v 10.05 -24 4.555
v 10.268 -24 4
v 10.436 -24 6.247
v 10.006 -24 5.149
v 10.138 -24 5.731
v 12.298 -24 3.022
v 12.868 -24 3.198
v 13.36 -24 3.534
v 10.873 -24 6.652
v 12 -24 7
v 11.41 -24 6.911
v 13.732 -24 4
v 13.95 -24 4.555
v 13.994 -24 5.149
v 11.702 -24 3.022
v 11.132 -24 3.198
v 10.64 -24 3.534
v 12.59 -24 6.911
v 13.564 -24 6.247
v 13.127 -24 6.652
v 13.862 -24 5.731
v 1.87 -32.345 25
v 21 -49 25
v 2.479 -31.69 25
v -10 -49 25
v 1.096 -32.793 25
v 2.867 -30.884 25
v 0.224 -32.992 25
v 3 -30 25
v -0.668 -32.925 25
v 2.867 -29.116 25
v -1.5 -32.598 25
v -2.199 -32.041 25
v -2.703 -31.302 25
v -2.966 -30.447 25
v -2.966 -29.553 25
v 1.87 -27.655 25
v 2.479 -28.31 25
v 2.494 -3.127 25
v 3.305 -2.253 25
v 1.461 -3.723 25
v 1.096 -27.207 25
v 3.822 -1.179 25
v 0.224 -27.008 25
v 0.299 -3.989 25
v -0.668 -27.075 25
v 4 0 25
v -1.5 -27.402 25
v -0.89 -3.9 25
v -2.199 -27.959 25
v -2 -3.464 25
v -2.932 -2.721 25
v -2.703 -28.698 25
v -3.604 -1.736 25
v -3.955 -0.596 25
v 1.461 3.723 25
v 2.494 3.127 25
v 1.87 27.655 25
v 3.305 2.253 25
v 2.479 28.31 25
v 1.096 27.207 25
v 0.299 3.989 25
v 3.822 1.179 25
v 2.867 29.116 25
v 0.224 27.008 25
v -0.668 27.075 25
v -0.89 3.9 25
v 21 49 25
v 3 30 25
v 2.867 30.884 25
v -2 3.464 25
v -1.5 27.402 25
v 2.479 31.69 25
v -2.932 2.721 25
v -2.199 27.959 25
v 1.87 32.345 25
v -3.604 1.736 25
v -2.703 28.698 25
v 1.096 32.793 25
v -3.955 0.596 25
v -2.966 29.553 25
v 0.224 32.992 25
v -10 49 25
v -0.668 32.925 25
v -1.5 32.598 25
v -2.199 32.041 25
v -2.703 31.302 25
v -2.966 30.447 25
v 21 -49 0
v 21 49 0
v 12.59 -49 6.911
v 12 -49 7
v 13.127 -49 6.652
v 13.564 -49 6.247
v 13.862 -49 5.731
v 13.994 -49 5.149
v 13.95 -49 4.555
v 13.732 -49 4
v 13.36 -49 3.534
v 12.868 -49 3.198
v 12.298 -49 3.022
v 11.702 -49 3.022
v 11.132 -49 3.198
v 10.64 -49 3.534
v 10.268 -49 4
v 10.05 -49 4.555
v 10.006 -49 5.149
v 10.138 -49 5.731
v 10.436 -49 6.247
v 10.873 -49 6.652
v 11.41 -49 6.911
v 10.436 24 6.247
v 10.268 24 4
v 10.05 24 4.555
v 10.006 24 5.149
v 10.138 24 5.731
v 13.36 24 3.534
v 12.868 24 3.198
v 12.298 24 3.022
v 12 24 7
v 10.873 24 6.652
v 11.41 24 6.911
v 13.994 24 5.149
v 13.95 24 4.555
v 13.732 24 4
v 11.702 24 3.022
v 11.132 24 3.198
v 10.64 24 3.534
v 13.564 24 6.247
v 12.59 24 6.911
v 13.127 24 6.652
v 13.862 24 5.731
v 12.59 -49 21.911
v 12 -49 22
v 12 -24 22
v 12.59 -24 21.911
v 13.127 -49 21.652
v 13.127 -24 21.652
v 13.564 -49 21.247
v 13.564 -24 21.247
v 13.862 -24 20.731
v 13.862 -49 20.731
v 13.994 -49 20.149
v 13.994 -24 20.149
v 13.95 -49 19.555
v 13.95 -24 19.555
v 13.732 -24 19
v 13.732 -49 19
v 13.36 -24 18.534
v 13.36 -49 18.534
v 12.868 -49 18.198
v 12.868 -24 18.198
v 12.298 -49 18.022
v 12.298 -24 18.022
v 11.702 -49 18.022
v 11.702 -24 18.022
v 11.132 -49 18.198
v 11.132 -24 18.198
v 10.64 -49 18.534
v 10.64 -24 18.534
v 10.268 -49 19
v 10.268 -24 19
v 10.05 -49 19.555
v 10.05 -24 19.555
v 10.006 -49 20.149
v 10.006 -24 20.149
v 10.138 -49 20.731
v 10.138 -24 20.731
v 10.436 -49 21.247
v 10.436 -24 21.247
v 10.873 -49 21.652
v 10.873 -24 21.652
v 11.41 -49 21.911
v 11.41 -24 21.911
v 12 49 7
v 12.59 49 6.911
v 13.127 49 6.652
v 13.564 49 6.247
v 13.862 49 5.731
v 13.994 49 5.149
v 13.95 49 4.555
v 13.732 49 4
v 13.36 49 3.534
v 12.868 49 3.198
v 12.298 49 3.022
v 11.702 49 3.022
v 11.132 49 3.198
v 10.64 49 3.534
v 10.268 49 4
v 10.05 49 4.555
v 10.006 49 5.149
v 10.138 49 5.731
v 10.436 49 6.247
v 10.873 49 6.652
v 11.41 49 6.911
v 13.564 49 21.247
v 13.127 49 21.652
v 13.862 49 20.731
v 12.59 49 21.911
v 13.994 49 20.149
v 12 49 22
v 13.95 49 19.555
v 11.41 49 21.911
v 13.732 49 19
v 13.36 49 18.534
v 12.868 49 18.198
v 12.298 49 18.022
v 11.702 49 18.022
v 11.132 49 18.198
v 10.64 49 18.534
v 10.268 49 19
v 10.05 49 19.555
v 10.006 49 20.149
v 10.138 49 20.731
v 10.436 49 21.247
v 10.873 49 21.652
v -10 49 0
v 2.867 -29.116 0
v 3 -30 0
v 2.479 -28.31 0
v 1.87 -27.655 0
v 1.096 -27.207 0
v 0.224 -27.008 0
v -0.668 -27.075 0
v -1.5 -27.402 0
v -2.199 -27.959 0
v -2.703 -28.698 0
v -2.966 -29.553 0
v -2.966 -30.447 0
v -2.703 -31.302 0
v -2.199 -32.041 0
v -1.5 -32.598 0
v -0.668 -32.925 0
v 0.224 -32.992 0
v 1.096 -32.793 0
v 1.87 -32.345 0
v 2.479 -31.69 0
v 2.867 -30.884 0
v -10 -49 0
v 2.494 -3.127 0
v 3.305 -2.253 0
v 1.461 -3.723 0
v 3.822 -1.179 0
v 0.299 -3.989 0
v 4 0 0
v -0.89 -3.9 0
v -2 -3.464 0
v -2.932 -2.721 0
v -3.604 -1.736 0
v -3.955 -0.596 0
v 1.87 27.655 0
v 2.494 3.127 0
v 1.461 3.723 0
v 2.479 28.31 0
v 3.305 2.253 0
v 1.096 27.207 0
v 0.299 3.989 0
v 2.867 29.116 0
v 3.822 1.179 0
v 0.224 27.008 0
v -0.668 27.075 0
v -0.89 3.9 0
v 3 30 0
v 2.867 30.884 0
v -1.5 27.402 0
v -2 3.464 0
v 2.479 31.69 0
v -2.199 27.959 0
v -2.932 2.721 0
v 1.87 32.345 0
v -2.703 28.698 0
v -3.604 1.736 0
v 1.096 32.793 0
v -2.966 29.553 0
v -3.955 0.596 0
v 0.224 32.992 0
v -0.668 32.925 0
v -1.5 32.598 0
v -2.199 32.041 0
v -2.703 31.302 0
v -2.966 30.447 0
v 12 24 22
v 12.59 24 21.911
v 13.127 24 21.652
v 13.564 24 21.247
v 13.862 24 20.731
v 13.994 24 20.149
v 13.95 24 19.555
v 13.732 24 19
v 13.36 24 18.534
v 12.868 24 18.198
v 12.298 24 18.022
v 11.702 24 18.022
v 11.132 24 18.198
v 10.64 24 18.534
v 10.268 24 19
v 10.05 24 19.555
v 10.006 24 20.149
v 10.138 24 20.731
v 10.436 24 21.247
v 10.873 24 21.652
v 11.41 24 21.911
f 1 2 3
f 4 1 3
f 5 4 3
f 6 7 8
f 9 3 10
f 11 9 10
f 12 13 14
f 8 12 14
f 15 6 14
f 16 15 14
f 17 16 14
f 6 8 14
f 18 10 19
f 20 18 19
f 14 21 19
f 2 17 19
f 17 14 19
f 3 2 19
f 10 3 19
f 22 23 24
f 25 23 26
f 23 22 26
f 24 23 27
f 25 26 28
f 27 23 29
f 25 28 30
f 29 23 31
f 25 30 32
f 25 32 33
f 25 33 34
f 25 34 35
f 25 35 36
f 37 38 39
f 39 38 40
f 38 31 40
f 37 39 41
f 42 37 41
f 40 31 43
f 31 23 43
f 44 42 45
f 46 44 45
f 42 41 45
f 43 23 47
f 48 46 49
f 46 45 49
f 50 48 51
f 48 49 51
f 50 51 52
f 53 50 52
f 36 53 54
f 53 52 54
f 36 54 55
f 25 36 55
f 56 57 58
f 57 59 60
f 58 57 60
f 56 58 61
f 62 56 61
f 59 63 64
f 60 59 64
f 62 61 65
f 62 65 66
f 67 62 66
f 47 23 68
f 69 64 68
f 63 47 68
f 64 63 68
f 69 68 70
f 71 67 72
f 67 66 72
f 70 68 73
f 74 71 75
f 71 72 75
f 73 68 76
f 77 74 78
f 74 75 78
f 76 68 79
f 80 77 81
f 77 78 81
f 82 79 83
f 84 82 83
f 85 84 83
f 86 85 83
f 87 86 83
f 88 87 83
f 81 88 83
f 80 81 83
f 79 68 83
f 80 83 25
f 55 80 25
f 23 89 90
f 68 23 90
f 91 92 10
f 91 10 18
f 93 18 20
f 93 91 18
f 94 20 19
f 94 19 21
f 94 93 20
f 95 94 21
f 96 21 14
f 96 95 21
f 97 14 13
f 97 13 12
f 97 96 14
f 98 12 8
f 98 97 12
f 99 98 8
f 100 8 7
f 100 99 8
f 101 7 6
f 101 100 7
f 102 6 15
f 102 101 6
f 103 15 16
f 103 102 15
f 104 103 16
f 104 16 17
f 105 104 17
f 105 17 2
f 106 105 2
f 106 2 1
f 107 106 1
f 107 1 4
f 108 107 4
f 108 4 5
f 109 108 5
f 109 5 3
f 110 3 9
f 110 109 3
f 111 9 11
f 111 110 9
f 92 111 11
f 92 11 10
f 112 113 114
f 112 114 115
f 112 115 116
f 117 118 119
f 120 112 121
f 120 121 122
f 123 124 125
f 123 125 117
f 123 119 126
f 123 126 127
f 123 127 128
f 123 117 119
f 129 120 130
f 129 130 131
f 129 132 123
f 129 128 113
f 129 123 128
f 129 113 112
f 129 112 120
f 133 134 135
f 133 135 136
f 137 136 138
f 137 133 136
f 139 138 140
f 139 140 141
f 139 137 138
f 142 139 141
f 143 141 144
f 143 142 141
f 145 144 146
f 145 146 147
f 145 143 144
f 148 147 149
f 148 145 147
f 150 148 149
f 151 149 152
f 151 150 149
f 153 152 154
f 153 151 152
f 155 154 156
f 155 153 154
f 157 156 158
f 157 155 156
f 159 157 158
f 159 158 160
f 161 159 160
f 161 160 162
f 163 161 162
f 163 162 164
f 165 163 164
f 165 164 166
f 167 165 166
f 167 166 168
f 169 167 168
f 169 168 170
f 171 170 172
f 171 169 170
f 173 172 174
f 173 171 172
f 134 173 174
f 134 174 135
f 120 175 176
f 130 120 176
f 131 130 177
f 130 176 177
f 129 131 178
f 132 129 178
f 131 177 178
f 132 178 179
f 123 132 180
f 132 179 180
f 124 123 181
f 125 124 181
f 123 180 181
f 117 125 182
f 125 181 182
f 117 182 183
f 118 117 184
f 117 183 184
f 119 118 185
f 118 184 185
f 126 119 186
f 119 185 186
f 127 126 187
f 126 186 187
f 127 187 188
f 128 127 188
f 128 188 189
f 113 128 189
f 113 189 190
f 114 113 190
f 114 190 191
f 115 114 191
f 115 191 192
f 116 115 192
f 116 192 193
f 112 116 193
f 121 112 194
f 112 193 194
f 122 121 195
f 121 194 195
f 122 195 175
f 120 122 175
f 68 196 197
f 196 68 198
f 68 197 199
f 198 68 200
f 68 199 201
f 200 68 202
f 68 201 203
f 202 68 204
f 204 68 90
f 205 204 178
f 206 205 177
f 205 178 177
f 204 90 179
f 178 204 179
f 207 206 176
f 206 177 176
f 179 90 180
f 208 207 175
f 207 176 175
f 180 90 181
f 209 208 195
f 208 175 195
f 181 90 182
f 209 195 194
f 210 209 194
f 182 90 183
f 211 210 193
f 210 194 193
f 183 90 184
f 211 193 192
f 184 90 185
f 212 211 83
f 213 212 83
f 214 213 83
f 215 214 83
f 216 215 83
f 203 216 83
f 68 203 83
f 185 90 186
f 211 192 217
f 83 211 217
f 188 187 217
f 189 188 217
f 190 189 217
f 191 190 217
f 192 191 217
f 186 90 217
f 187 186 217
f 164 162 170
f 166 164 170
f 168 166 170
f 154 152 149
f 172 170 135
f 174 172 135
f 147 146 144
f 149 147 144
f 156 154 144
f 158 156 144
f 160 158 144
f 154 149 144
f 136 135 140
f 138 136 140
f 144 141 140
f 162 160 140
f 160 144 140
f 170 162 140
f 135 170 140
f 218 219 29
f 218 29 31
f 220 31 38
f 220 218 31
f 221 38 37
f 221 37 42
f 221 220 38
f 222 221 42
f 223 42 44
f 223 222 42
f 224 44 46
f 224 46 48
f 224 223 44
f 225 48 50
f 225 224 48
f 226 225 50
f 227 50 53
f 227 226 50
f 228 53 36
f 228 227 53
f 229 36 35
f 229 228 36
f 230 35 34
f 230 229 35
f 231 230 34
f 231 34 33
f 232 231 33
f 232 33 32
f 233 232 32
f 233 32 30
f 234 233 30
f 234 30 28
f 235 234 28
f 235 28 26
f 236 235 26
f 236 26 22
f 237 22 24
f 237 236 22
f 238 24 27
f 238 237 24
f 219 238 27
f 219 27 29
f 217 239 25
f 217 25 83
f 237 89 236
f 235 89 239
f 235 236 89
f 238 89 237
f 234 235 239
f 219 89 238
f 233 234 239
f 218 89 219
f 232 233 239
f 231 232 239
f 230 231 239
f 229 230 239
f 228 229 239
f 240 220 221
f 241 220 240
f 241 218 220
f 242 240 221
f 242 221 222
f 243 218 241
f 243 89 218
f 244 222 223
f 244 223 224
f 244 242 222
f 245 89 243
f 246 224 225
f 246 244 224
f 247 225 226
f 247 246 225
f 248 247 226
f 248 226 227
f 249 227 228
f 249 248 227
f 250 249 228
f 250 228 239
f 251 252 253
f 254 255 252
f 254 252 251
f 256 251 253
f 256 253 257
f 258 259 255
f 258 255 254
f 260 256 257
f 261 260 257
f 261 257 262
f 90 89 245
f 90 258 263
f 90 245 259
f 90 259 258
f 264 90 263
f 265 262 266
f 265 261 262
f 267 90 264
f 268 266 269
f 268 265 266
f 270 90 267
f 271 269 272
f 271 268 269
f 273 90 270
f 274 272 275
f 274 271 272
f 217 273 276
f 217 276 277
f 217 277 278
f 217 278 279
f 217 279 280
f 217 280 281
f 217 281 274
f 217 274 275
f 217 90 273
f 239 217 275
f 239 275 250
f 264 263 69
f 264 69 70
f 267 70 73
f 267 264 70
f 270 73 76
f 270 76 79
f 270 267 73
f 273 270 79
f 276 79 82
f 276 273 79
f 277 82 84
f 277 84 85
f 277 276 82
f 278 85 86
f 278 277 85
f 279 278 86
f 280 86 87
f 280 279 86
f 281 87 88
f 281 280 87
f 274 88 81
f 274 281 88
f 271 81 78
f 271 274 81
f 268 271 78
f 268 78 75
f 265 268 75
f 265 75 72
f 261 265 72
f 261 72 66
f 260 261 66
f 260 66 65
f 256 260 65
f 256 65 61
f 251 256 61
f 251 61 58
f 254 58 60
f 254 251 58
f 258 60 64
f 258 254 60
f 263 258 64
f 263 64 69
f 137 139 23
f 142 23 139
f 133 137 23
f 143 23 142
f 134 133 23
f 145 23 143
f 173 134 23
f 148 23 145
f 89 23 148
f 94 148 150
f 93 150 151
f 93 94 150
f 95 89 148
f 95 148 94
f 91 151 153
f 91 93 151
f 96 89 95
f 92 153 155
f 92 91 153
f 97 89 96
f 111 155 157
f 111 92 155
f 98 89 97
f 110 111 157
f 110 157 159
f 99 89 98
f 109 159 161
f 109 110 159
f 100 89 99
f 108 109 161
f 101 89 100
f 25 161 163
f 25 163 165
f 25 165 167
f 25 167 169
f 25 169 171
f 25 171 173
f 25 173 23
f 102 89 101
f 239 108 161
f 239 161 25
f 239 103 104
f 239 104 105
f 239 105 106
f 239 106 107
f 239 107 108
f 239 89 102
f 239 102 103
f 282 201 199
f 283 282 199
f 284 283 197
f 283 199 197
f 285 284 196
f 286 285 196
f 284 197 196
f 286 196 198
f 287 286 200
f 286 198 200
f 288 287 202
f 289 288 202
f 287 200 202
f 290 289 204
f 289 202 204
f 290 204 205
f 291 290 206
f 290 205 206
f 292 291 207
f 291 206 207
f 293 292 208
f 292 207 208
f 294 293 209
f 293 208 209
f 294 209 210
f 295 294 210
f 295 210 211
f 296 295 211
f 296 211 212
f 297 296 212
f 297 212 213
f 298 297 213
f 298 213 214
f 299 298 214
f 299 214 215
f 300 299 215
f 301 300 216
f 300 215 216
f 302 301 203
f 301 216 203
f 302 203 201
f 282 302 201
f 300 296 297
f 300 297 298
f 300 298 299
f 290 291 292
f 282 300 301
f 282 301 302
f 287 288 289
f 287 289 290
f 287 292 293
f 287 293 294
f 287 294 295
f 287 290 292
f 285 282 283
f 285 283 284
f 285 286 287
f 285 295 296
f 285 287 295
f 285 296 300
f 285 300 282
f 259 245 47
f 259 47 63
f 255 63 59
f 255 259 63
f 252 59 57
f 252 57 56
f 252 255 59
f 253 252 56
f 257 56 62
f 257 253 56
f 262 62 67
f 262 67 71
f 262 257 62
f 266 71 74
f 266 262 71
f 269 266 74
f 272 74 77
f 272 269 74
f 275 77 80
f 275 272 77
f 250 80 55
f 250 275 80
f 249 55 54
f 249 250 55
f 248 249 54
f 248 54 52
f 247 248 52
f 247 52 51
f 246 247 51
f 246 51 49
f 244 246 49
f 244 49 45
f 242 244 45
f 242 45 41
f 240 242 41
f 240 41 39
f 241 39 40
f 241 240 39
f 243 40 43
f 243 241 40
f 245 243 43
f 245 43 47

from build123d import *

# Parameters (mm, degrees)
SKETCH1_W           = 20
SKETCH1_H           = 98
SKETCH1_R           = 4
SKETCH1_R_2         = 3
BOSS_EXTRUDE1_DEPTH = 25
SKETCH2_W           = 11
SKETCH2_H           = 98
BOSS_EXTRUDE2_DEPTH = 25
SKETCH3_R           = 2
CUT_EXTRUDE1_DEPTH  = 25


with BuildPart() as part:
    # Sketch1 → Boss-Extrude1 (new body)
    with BuildSketch(Plane.XY):
        Rectangle(SKETCH1_W, SKETCH1_H)
        Circle(SKETCH1_R, mode=Mode.SUBTRACT)
        with Locations((0, -30)):
            Circle(SKETCH1_R_2, mode=Mode.SUBTRACT)
        with Locations((0, 30)):
            Circle(SKETCH1_R_2, mode=Mode.SUBTRACT)
    extrude(amount=BOSS_EXTRUDE1_DEPTH)

    # Sketch2 → Boss-Extrude2 (add, through all)
    with BuildSketch(Plane(origin=(0, 0, 0), x_dir=(-1, 0, 0), z_dir=(0, 0, -1))):
        with Locations((-15.5, 0)):
            Rectangle(SKETCH2_W, SKETCH2_H)
    extrude(amount=-BOSS_EXTRUDE2_DEPTH)

    # Sketch3 → Cut-Extrude1 (cut)
    with BuildSketch(Plane(origin=(0, 49, 0), x_dir=(1, 0, 0), z_dir=(0, 1, 0))):
        with Locations(Location((12, -5, 0), (0, 0, 270))):
            Circle(SKETCH3_R)
        with Locations(Location((12, -20, 0), (0, 0, 270))):
            Circle(SKETCH3_R)
    cut_extrude1 = extrude(amount=-CUT_EXTRUDE1_DEPTH, mode=Mode.SUBTRACT)

    # Mirror1: Cut-Extrude1 across plane
    add(cut_extrude1.mirror(Plane.ZX), mode=Mode.SUBTRACT)


solid = part.part
